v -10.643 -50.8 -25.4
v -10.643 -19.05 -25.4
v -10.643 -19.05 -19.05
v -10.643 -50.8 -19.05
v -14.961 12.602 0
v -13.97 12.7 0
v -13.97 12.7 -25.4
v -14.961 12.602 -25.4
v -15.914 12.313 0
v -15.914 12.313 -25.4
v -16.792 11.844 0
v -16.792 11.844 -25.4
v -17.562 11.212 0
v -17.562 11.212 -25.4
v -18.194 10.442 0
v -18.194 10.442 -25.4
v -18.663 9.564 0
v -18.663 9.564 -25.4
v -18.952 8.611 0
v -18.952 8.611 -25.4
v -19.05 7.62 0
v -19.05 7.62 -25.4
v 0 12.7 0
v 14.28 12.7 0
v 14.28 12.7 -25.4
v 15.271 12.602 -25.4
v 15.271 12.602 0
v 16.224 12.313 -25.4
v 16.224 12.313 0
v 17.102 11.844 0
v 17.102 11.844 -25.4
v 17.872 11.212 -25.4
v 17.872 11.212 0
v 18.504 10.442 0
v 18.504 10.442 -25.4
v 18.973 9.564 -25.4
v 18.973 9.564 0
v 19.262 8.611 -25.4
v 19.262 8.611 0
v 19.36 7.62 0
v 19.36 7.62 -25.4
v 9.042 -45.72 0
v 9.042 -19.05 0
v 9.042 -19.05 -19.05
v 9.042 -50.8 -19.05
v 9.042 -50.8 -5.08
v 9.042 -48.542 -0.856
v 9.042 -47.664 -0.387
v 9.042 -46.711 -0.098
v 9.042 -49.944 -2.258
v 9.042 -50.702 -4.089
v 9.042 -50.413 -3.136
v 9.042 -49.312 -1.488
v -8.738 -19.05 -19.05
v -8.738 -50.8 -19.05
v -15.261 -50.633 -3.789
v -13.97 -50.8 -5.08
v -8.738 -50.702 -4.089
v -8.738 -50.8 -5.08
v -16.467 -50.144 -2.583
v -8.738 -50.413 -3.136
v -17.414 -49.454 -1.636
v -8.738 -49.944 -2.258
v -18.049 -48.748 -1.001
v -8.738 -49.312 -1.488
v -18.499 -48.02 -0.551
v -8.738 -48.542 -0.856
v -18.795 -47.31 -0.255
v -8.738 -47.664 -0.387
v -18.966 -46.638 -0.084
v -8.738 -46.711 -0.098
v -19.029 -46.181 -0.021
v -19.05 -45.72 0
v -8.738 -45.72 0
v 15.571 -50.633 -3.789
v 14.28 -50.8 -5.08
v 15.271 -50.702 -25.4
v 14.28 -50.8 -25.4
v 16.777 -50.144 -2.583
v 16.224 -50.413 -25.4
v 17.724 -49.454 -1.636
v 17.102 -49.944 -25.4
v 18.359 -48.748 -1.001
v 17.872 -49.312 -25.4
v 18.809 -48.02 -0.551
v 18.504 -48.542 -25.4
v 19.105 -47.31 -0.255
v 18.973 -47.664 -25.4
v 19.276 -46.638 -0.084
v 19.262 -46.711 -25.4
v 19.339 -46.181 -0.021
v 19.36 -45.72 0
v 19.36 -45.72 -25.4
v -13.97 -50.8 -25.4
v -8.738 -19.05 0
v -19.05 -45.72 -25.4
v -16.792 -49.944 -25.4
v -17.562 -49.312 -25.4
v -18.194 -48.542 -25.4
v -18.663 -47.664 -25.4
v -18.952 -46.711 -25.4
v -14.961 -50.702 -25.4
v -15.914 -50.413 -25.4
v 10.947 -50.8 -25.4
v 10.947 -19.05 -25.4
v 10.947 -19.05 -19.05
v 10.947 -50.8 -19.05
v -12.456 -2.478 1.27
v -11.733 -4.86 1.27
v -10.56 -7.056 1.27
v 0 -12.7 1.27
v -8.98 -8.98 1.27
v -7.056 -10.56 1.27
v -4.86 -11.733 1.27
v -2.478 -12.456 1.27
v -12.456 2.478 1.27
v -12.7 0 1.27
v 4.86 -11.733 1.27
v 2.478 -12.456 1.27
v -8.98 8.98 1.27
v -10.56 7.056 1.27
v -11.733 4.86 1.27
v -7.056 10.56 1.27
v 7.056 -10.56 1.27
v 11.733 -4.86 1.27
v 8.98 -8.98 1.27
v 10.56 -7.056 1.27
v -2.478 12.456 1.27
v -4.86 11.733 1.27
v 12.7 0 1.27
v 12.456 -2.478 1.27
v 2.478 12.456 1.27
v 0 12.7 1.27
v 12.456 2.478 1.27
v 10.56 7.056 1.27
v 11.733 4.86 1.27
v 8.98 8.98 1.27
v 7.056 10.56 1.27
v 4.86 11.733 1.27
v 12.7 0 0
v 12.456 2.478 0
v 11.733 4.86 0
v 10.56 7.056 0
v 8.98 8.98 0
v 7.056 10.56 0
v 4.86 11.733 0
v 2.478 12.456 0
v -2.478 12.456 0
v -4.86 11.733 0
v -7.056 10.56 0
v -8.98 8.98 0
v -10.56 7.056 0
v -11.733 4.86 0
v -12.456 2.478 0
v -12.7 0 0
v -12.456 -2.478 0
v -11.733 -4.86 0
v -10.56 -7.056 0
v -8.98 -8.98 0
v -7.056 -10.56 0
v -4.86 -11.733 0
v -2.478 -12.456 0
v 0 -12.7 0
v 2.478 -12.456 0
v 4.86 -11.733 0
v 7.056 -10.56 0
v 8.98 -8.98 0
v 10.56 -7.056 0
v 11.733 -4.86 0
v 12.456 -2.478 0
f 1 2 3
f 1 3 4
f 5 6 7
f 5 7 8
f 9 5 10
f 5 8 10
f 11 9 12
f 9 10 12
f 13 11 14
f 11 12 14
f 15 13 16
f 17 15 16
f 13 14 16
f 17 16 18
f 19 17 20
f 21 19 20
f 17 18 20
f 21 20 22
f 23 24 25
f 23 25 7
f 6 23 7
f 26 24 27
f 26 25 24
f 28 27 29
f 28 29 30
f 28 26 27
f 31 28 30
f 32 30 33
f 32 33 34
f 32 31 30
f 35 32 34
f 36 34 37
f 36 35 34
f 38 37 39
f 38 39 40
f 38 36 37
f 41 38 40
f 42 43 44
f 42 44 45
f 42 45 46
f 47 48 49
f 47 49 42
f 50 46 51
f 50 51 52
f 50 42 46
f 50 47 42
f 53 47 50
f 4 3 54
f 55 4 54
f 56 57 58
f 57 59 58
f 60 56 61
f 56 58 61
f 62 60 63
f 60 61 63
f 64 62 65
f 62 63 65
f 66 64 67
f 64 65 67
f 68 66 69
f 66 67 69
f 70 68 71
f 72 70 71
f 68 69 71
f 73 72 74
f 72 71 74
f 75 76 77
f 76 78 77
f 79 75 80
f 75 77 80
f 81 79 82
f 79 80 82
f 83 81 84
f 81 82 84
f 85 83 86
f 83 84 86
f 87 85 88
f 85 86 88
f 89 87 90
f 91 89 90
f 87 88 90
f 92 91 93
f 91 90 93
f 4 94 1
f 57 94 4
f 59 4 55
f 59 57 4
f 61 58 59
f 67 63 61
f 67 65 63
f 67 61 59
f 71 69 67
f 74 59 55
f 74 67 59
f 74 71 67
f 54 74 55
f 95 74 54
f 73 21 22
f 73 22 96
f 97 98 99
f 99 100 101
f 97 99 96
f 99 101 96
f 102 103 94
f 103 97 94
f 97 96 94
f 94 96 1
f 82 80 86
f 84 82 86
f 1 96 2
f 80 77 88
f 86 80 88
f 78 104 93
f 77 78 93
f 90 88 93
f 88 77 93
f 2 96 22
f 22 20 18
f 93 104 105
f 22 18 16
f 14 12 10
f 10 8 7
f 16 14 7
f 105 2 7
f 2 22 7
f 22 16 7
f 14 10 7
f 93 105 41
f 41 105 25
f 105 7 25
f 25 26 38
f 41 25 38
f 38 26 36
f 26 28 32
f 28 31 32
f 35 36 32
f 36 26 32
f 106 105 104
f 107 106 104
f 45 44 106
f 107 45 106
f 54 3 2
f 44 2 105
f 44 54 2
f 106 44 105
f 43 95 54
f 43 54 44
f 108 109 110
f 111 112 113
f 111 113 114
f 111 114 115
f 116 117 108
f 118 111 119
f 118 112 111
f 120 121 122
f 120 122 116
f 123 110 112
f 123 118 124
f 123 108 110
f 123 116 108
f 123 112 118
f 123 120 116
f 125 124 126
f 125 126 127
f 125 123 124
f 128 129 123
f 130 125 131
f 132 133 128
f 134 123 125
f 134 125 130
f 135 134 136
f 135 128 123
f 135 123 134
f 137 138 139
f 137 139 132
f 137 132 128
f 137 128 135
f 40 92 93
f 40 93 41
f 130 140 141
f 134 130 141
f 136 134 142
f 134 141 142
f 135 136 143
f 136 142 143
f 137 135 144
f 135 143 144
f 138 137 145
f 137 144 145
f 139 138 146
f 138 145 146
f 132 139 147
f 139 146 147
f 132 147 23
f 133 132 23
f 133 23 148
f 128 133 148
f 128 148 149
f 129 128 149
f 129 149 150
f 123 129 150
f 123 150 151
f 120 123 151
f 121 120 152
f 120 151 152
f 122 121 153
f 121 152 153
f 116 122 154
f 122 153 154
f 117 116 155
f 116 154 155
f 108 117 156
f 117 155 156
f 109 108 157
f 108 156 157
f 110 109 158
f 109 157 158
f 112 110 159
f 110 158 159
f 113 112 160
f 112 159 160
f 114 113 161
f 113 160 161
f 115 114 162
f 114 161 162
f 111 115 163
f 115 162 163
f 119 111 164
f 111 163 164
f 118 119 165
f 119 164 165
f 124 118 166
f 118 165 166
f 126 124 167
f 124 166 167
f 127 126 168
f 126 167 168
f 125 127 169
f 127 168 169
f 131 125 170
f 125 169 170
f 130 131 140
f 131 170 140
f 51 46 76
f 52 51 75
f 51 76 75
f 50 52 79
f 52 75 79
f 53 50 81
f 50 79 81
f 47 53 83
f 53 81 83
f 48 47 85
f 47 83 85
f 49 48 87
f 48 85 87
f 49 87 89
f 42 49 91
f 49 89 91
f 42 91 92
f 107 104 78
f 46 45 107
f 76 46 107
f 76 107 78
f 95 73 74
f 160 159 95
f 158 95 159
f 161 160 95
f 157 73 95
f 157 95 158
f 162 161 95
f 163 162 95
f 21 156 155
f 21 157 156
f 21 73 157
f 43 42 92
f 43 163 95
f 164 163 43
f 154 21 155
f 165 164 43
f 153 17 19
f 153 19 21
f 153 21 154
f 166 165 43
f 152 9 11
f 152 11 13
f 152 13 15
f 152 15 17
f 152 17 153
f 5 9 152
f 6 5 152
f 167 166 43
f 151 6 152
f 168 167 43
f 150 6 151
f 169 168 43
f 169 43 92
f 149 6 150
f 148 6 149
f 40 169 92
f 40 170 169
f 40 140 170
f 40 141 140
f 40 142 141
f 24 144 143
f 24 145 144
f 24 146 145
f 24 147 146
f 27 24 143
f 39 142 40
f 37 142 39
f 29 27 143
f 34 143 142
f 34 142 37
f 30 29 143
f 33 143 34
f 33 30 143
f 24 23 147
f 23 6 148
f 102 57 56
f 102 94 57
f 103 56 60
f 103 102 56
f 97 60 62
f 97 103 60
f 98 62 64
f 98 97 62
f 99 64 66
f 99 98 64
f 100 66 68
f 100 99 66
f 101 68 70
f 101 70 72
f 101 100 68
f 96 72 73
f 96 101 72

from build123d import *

# Parameters (mm, degrees)
F0_R     = 12.7
F1_DEPTH = 1.27
F3_DEPTH = 25.4
F5_W     = 1.905
F5_H     = 31.75
F6_DEPTH = 6.35
F7_R     = 5.08


with BuildPart() as f1:
    # F0 (on Top) → F1 (new body)
    with BuildSketch(Plane.XY):
        Circle(F0_R)
    extrude(amount=F1_DEPTH)

    # F2 (on Top) → F3 (join)
    with BuildSketch(Plane.XY):
        Polygon((19.35988, 12.7), (-19.05, 12.7), (-19.05, -50.8), (-8.7376, -50.8), (-8.7376, -19.05), (9.0424, -19.05), (9.0424, -50.8), (19.35988, -50.8), align=None)
    extrude(amount=-F3_DEPTH)

    # F5 (on face) → F6 (cut)
    with BuildSketch(Plane(origin=(0, 0, -25.4), x_dir=(1, 0, 0), z_dir=(0, 0, -1))):
        with Locations((-9.6901, 34.925)):
            Rectangle(F5_W, F5_H)
        with Locations((9.9949, 34.925)):
            Rectangle(F5_W, F5_H)
    extrude(amount=-F6_DEPTH, mode=Mode.SUBTRACT)

    # F7
    f7_edges = [f1.edges().sort_by_distance(p)[0] for p in [
        (-13.8938, -50.8, 0),
        (-19.05, -50.8, -12.7),
        (14.20114, -50.8, 0),
        (19.35988, -50.8, -12.7),
        (19.35988, 12.7, -12.7),
        (-19.05, 12.7, -12.7),
    ]]
    fillet(f7_edges, radius=F7_R)


solid = f1.part
